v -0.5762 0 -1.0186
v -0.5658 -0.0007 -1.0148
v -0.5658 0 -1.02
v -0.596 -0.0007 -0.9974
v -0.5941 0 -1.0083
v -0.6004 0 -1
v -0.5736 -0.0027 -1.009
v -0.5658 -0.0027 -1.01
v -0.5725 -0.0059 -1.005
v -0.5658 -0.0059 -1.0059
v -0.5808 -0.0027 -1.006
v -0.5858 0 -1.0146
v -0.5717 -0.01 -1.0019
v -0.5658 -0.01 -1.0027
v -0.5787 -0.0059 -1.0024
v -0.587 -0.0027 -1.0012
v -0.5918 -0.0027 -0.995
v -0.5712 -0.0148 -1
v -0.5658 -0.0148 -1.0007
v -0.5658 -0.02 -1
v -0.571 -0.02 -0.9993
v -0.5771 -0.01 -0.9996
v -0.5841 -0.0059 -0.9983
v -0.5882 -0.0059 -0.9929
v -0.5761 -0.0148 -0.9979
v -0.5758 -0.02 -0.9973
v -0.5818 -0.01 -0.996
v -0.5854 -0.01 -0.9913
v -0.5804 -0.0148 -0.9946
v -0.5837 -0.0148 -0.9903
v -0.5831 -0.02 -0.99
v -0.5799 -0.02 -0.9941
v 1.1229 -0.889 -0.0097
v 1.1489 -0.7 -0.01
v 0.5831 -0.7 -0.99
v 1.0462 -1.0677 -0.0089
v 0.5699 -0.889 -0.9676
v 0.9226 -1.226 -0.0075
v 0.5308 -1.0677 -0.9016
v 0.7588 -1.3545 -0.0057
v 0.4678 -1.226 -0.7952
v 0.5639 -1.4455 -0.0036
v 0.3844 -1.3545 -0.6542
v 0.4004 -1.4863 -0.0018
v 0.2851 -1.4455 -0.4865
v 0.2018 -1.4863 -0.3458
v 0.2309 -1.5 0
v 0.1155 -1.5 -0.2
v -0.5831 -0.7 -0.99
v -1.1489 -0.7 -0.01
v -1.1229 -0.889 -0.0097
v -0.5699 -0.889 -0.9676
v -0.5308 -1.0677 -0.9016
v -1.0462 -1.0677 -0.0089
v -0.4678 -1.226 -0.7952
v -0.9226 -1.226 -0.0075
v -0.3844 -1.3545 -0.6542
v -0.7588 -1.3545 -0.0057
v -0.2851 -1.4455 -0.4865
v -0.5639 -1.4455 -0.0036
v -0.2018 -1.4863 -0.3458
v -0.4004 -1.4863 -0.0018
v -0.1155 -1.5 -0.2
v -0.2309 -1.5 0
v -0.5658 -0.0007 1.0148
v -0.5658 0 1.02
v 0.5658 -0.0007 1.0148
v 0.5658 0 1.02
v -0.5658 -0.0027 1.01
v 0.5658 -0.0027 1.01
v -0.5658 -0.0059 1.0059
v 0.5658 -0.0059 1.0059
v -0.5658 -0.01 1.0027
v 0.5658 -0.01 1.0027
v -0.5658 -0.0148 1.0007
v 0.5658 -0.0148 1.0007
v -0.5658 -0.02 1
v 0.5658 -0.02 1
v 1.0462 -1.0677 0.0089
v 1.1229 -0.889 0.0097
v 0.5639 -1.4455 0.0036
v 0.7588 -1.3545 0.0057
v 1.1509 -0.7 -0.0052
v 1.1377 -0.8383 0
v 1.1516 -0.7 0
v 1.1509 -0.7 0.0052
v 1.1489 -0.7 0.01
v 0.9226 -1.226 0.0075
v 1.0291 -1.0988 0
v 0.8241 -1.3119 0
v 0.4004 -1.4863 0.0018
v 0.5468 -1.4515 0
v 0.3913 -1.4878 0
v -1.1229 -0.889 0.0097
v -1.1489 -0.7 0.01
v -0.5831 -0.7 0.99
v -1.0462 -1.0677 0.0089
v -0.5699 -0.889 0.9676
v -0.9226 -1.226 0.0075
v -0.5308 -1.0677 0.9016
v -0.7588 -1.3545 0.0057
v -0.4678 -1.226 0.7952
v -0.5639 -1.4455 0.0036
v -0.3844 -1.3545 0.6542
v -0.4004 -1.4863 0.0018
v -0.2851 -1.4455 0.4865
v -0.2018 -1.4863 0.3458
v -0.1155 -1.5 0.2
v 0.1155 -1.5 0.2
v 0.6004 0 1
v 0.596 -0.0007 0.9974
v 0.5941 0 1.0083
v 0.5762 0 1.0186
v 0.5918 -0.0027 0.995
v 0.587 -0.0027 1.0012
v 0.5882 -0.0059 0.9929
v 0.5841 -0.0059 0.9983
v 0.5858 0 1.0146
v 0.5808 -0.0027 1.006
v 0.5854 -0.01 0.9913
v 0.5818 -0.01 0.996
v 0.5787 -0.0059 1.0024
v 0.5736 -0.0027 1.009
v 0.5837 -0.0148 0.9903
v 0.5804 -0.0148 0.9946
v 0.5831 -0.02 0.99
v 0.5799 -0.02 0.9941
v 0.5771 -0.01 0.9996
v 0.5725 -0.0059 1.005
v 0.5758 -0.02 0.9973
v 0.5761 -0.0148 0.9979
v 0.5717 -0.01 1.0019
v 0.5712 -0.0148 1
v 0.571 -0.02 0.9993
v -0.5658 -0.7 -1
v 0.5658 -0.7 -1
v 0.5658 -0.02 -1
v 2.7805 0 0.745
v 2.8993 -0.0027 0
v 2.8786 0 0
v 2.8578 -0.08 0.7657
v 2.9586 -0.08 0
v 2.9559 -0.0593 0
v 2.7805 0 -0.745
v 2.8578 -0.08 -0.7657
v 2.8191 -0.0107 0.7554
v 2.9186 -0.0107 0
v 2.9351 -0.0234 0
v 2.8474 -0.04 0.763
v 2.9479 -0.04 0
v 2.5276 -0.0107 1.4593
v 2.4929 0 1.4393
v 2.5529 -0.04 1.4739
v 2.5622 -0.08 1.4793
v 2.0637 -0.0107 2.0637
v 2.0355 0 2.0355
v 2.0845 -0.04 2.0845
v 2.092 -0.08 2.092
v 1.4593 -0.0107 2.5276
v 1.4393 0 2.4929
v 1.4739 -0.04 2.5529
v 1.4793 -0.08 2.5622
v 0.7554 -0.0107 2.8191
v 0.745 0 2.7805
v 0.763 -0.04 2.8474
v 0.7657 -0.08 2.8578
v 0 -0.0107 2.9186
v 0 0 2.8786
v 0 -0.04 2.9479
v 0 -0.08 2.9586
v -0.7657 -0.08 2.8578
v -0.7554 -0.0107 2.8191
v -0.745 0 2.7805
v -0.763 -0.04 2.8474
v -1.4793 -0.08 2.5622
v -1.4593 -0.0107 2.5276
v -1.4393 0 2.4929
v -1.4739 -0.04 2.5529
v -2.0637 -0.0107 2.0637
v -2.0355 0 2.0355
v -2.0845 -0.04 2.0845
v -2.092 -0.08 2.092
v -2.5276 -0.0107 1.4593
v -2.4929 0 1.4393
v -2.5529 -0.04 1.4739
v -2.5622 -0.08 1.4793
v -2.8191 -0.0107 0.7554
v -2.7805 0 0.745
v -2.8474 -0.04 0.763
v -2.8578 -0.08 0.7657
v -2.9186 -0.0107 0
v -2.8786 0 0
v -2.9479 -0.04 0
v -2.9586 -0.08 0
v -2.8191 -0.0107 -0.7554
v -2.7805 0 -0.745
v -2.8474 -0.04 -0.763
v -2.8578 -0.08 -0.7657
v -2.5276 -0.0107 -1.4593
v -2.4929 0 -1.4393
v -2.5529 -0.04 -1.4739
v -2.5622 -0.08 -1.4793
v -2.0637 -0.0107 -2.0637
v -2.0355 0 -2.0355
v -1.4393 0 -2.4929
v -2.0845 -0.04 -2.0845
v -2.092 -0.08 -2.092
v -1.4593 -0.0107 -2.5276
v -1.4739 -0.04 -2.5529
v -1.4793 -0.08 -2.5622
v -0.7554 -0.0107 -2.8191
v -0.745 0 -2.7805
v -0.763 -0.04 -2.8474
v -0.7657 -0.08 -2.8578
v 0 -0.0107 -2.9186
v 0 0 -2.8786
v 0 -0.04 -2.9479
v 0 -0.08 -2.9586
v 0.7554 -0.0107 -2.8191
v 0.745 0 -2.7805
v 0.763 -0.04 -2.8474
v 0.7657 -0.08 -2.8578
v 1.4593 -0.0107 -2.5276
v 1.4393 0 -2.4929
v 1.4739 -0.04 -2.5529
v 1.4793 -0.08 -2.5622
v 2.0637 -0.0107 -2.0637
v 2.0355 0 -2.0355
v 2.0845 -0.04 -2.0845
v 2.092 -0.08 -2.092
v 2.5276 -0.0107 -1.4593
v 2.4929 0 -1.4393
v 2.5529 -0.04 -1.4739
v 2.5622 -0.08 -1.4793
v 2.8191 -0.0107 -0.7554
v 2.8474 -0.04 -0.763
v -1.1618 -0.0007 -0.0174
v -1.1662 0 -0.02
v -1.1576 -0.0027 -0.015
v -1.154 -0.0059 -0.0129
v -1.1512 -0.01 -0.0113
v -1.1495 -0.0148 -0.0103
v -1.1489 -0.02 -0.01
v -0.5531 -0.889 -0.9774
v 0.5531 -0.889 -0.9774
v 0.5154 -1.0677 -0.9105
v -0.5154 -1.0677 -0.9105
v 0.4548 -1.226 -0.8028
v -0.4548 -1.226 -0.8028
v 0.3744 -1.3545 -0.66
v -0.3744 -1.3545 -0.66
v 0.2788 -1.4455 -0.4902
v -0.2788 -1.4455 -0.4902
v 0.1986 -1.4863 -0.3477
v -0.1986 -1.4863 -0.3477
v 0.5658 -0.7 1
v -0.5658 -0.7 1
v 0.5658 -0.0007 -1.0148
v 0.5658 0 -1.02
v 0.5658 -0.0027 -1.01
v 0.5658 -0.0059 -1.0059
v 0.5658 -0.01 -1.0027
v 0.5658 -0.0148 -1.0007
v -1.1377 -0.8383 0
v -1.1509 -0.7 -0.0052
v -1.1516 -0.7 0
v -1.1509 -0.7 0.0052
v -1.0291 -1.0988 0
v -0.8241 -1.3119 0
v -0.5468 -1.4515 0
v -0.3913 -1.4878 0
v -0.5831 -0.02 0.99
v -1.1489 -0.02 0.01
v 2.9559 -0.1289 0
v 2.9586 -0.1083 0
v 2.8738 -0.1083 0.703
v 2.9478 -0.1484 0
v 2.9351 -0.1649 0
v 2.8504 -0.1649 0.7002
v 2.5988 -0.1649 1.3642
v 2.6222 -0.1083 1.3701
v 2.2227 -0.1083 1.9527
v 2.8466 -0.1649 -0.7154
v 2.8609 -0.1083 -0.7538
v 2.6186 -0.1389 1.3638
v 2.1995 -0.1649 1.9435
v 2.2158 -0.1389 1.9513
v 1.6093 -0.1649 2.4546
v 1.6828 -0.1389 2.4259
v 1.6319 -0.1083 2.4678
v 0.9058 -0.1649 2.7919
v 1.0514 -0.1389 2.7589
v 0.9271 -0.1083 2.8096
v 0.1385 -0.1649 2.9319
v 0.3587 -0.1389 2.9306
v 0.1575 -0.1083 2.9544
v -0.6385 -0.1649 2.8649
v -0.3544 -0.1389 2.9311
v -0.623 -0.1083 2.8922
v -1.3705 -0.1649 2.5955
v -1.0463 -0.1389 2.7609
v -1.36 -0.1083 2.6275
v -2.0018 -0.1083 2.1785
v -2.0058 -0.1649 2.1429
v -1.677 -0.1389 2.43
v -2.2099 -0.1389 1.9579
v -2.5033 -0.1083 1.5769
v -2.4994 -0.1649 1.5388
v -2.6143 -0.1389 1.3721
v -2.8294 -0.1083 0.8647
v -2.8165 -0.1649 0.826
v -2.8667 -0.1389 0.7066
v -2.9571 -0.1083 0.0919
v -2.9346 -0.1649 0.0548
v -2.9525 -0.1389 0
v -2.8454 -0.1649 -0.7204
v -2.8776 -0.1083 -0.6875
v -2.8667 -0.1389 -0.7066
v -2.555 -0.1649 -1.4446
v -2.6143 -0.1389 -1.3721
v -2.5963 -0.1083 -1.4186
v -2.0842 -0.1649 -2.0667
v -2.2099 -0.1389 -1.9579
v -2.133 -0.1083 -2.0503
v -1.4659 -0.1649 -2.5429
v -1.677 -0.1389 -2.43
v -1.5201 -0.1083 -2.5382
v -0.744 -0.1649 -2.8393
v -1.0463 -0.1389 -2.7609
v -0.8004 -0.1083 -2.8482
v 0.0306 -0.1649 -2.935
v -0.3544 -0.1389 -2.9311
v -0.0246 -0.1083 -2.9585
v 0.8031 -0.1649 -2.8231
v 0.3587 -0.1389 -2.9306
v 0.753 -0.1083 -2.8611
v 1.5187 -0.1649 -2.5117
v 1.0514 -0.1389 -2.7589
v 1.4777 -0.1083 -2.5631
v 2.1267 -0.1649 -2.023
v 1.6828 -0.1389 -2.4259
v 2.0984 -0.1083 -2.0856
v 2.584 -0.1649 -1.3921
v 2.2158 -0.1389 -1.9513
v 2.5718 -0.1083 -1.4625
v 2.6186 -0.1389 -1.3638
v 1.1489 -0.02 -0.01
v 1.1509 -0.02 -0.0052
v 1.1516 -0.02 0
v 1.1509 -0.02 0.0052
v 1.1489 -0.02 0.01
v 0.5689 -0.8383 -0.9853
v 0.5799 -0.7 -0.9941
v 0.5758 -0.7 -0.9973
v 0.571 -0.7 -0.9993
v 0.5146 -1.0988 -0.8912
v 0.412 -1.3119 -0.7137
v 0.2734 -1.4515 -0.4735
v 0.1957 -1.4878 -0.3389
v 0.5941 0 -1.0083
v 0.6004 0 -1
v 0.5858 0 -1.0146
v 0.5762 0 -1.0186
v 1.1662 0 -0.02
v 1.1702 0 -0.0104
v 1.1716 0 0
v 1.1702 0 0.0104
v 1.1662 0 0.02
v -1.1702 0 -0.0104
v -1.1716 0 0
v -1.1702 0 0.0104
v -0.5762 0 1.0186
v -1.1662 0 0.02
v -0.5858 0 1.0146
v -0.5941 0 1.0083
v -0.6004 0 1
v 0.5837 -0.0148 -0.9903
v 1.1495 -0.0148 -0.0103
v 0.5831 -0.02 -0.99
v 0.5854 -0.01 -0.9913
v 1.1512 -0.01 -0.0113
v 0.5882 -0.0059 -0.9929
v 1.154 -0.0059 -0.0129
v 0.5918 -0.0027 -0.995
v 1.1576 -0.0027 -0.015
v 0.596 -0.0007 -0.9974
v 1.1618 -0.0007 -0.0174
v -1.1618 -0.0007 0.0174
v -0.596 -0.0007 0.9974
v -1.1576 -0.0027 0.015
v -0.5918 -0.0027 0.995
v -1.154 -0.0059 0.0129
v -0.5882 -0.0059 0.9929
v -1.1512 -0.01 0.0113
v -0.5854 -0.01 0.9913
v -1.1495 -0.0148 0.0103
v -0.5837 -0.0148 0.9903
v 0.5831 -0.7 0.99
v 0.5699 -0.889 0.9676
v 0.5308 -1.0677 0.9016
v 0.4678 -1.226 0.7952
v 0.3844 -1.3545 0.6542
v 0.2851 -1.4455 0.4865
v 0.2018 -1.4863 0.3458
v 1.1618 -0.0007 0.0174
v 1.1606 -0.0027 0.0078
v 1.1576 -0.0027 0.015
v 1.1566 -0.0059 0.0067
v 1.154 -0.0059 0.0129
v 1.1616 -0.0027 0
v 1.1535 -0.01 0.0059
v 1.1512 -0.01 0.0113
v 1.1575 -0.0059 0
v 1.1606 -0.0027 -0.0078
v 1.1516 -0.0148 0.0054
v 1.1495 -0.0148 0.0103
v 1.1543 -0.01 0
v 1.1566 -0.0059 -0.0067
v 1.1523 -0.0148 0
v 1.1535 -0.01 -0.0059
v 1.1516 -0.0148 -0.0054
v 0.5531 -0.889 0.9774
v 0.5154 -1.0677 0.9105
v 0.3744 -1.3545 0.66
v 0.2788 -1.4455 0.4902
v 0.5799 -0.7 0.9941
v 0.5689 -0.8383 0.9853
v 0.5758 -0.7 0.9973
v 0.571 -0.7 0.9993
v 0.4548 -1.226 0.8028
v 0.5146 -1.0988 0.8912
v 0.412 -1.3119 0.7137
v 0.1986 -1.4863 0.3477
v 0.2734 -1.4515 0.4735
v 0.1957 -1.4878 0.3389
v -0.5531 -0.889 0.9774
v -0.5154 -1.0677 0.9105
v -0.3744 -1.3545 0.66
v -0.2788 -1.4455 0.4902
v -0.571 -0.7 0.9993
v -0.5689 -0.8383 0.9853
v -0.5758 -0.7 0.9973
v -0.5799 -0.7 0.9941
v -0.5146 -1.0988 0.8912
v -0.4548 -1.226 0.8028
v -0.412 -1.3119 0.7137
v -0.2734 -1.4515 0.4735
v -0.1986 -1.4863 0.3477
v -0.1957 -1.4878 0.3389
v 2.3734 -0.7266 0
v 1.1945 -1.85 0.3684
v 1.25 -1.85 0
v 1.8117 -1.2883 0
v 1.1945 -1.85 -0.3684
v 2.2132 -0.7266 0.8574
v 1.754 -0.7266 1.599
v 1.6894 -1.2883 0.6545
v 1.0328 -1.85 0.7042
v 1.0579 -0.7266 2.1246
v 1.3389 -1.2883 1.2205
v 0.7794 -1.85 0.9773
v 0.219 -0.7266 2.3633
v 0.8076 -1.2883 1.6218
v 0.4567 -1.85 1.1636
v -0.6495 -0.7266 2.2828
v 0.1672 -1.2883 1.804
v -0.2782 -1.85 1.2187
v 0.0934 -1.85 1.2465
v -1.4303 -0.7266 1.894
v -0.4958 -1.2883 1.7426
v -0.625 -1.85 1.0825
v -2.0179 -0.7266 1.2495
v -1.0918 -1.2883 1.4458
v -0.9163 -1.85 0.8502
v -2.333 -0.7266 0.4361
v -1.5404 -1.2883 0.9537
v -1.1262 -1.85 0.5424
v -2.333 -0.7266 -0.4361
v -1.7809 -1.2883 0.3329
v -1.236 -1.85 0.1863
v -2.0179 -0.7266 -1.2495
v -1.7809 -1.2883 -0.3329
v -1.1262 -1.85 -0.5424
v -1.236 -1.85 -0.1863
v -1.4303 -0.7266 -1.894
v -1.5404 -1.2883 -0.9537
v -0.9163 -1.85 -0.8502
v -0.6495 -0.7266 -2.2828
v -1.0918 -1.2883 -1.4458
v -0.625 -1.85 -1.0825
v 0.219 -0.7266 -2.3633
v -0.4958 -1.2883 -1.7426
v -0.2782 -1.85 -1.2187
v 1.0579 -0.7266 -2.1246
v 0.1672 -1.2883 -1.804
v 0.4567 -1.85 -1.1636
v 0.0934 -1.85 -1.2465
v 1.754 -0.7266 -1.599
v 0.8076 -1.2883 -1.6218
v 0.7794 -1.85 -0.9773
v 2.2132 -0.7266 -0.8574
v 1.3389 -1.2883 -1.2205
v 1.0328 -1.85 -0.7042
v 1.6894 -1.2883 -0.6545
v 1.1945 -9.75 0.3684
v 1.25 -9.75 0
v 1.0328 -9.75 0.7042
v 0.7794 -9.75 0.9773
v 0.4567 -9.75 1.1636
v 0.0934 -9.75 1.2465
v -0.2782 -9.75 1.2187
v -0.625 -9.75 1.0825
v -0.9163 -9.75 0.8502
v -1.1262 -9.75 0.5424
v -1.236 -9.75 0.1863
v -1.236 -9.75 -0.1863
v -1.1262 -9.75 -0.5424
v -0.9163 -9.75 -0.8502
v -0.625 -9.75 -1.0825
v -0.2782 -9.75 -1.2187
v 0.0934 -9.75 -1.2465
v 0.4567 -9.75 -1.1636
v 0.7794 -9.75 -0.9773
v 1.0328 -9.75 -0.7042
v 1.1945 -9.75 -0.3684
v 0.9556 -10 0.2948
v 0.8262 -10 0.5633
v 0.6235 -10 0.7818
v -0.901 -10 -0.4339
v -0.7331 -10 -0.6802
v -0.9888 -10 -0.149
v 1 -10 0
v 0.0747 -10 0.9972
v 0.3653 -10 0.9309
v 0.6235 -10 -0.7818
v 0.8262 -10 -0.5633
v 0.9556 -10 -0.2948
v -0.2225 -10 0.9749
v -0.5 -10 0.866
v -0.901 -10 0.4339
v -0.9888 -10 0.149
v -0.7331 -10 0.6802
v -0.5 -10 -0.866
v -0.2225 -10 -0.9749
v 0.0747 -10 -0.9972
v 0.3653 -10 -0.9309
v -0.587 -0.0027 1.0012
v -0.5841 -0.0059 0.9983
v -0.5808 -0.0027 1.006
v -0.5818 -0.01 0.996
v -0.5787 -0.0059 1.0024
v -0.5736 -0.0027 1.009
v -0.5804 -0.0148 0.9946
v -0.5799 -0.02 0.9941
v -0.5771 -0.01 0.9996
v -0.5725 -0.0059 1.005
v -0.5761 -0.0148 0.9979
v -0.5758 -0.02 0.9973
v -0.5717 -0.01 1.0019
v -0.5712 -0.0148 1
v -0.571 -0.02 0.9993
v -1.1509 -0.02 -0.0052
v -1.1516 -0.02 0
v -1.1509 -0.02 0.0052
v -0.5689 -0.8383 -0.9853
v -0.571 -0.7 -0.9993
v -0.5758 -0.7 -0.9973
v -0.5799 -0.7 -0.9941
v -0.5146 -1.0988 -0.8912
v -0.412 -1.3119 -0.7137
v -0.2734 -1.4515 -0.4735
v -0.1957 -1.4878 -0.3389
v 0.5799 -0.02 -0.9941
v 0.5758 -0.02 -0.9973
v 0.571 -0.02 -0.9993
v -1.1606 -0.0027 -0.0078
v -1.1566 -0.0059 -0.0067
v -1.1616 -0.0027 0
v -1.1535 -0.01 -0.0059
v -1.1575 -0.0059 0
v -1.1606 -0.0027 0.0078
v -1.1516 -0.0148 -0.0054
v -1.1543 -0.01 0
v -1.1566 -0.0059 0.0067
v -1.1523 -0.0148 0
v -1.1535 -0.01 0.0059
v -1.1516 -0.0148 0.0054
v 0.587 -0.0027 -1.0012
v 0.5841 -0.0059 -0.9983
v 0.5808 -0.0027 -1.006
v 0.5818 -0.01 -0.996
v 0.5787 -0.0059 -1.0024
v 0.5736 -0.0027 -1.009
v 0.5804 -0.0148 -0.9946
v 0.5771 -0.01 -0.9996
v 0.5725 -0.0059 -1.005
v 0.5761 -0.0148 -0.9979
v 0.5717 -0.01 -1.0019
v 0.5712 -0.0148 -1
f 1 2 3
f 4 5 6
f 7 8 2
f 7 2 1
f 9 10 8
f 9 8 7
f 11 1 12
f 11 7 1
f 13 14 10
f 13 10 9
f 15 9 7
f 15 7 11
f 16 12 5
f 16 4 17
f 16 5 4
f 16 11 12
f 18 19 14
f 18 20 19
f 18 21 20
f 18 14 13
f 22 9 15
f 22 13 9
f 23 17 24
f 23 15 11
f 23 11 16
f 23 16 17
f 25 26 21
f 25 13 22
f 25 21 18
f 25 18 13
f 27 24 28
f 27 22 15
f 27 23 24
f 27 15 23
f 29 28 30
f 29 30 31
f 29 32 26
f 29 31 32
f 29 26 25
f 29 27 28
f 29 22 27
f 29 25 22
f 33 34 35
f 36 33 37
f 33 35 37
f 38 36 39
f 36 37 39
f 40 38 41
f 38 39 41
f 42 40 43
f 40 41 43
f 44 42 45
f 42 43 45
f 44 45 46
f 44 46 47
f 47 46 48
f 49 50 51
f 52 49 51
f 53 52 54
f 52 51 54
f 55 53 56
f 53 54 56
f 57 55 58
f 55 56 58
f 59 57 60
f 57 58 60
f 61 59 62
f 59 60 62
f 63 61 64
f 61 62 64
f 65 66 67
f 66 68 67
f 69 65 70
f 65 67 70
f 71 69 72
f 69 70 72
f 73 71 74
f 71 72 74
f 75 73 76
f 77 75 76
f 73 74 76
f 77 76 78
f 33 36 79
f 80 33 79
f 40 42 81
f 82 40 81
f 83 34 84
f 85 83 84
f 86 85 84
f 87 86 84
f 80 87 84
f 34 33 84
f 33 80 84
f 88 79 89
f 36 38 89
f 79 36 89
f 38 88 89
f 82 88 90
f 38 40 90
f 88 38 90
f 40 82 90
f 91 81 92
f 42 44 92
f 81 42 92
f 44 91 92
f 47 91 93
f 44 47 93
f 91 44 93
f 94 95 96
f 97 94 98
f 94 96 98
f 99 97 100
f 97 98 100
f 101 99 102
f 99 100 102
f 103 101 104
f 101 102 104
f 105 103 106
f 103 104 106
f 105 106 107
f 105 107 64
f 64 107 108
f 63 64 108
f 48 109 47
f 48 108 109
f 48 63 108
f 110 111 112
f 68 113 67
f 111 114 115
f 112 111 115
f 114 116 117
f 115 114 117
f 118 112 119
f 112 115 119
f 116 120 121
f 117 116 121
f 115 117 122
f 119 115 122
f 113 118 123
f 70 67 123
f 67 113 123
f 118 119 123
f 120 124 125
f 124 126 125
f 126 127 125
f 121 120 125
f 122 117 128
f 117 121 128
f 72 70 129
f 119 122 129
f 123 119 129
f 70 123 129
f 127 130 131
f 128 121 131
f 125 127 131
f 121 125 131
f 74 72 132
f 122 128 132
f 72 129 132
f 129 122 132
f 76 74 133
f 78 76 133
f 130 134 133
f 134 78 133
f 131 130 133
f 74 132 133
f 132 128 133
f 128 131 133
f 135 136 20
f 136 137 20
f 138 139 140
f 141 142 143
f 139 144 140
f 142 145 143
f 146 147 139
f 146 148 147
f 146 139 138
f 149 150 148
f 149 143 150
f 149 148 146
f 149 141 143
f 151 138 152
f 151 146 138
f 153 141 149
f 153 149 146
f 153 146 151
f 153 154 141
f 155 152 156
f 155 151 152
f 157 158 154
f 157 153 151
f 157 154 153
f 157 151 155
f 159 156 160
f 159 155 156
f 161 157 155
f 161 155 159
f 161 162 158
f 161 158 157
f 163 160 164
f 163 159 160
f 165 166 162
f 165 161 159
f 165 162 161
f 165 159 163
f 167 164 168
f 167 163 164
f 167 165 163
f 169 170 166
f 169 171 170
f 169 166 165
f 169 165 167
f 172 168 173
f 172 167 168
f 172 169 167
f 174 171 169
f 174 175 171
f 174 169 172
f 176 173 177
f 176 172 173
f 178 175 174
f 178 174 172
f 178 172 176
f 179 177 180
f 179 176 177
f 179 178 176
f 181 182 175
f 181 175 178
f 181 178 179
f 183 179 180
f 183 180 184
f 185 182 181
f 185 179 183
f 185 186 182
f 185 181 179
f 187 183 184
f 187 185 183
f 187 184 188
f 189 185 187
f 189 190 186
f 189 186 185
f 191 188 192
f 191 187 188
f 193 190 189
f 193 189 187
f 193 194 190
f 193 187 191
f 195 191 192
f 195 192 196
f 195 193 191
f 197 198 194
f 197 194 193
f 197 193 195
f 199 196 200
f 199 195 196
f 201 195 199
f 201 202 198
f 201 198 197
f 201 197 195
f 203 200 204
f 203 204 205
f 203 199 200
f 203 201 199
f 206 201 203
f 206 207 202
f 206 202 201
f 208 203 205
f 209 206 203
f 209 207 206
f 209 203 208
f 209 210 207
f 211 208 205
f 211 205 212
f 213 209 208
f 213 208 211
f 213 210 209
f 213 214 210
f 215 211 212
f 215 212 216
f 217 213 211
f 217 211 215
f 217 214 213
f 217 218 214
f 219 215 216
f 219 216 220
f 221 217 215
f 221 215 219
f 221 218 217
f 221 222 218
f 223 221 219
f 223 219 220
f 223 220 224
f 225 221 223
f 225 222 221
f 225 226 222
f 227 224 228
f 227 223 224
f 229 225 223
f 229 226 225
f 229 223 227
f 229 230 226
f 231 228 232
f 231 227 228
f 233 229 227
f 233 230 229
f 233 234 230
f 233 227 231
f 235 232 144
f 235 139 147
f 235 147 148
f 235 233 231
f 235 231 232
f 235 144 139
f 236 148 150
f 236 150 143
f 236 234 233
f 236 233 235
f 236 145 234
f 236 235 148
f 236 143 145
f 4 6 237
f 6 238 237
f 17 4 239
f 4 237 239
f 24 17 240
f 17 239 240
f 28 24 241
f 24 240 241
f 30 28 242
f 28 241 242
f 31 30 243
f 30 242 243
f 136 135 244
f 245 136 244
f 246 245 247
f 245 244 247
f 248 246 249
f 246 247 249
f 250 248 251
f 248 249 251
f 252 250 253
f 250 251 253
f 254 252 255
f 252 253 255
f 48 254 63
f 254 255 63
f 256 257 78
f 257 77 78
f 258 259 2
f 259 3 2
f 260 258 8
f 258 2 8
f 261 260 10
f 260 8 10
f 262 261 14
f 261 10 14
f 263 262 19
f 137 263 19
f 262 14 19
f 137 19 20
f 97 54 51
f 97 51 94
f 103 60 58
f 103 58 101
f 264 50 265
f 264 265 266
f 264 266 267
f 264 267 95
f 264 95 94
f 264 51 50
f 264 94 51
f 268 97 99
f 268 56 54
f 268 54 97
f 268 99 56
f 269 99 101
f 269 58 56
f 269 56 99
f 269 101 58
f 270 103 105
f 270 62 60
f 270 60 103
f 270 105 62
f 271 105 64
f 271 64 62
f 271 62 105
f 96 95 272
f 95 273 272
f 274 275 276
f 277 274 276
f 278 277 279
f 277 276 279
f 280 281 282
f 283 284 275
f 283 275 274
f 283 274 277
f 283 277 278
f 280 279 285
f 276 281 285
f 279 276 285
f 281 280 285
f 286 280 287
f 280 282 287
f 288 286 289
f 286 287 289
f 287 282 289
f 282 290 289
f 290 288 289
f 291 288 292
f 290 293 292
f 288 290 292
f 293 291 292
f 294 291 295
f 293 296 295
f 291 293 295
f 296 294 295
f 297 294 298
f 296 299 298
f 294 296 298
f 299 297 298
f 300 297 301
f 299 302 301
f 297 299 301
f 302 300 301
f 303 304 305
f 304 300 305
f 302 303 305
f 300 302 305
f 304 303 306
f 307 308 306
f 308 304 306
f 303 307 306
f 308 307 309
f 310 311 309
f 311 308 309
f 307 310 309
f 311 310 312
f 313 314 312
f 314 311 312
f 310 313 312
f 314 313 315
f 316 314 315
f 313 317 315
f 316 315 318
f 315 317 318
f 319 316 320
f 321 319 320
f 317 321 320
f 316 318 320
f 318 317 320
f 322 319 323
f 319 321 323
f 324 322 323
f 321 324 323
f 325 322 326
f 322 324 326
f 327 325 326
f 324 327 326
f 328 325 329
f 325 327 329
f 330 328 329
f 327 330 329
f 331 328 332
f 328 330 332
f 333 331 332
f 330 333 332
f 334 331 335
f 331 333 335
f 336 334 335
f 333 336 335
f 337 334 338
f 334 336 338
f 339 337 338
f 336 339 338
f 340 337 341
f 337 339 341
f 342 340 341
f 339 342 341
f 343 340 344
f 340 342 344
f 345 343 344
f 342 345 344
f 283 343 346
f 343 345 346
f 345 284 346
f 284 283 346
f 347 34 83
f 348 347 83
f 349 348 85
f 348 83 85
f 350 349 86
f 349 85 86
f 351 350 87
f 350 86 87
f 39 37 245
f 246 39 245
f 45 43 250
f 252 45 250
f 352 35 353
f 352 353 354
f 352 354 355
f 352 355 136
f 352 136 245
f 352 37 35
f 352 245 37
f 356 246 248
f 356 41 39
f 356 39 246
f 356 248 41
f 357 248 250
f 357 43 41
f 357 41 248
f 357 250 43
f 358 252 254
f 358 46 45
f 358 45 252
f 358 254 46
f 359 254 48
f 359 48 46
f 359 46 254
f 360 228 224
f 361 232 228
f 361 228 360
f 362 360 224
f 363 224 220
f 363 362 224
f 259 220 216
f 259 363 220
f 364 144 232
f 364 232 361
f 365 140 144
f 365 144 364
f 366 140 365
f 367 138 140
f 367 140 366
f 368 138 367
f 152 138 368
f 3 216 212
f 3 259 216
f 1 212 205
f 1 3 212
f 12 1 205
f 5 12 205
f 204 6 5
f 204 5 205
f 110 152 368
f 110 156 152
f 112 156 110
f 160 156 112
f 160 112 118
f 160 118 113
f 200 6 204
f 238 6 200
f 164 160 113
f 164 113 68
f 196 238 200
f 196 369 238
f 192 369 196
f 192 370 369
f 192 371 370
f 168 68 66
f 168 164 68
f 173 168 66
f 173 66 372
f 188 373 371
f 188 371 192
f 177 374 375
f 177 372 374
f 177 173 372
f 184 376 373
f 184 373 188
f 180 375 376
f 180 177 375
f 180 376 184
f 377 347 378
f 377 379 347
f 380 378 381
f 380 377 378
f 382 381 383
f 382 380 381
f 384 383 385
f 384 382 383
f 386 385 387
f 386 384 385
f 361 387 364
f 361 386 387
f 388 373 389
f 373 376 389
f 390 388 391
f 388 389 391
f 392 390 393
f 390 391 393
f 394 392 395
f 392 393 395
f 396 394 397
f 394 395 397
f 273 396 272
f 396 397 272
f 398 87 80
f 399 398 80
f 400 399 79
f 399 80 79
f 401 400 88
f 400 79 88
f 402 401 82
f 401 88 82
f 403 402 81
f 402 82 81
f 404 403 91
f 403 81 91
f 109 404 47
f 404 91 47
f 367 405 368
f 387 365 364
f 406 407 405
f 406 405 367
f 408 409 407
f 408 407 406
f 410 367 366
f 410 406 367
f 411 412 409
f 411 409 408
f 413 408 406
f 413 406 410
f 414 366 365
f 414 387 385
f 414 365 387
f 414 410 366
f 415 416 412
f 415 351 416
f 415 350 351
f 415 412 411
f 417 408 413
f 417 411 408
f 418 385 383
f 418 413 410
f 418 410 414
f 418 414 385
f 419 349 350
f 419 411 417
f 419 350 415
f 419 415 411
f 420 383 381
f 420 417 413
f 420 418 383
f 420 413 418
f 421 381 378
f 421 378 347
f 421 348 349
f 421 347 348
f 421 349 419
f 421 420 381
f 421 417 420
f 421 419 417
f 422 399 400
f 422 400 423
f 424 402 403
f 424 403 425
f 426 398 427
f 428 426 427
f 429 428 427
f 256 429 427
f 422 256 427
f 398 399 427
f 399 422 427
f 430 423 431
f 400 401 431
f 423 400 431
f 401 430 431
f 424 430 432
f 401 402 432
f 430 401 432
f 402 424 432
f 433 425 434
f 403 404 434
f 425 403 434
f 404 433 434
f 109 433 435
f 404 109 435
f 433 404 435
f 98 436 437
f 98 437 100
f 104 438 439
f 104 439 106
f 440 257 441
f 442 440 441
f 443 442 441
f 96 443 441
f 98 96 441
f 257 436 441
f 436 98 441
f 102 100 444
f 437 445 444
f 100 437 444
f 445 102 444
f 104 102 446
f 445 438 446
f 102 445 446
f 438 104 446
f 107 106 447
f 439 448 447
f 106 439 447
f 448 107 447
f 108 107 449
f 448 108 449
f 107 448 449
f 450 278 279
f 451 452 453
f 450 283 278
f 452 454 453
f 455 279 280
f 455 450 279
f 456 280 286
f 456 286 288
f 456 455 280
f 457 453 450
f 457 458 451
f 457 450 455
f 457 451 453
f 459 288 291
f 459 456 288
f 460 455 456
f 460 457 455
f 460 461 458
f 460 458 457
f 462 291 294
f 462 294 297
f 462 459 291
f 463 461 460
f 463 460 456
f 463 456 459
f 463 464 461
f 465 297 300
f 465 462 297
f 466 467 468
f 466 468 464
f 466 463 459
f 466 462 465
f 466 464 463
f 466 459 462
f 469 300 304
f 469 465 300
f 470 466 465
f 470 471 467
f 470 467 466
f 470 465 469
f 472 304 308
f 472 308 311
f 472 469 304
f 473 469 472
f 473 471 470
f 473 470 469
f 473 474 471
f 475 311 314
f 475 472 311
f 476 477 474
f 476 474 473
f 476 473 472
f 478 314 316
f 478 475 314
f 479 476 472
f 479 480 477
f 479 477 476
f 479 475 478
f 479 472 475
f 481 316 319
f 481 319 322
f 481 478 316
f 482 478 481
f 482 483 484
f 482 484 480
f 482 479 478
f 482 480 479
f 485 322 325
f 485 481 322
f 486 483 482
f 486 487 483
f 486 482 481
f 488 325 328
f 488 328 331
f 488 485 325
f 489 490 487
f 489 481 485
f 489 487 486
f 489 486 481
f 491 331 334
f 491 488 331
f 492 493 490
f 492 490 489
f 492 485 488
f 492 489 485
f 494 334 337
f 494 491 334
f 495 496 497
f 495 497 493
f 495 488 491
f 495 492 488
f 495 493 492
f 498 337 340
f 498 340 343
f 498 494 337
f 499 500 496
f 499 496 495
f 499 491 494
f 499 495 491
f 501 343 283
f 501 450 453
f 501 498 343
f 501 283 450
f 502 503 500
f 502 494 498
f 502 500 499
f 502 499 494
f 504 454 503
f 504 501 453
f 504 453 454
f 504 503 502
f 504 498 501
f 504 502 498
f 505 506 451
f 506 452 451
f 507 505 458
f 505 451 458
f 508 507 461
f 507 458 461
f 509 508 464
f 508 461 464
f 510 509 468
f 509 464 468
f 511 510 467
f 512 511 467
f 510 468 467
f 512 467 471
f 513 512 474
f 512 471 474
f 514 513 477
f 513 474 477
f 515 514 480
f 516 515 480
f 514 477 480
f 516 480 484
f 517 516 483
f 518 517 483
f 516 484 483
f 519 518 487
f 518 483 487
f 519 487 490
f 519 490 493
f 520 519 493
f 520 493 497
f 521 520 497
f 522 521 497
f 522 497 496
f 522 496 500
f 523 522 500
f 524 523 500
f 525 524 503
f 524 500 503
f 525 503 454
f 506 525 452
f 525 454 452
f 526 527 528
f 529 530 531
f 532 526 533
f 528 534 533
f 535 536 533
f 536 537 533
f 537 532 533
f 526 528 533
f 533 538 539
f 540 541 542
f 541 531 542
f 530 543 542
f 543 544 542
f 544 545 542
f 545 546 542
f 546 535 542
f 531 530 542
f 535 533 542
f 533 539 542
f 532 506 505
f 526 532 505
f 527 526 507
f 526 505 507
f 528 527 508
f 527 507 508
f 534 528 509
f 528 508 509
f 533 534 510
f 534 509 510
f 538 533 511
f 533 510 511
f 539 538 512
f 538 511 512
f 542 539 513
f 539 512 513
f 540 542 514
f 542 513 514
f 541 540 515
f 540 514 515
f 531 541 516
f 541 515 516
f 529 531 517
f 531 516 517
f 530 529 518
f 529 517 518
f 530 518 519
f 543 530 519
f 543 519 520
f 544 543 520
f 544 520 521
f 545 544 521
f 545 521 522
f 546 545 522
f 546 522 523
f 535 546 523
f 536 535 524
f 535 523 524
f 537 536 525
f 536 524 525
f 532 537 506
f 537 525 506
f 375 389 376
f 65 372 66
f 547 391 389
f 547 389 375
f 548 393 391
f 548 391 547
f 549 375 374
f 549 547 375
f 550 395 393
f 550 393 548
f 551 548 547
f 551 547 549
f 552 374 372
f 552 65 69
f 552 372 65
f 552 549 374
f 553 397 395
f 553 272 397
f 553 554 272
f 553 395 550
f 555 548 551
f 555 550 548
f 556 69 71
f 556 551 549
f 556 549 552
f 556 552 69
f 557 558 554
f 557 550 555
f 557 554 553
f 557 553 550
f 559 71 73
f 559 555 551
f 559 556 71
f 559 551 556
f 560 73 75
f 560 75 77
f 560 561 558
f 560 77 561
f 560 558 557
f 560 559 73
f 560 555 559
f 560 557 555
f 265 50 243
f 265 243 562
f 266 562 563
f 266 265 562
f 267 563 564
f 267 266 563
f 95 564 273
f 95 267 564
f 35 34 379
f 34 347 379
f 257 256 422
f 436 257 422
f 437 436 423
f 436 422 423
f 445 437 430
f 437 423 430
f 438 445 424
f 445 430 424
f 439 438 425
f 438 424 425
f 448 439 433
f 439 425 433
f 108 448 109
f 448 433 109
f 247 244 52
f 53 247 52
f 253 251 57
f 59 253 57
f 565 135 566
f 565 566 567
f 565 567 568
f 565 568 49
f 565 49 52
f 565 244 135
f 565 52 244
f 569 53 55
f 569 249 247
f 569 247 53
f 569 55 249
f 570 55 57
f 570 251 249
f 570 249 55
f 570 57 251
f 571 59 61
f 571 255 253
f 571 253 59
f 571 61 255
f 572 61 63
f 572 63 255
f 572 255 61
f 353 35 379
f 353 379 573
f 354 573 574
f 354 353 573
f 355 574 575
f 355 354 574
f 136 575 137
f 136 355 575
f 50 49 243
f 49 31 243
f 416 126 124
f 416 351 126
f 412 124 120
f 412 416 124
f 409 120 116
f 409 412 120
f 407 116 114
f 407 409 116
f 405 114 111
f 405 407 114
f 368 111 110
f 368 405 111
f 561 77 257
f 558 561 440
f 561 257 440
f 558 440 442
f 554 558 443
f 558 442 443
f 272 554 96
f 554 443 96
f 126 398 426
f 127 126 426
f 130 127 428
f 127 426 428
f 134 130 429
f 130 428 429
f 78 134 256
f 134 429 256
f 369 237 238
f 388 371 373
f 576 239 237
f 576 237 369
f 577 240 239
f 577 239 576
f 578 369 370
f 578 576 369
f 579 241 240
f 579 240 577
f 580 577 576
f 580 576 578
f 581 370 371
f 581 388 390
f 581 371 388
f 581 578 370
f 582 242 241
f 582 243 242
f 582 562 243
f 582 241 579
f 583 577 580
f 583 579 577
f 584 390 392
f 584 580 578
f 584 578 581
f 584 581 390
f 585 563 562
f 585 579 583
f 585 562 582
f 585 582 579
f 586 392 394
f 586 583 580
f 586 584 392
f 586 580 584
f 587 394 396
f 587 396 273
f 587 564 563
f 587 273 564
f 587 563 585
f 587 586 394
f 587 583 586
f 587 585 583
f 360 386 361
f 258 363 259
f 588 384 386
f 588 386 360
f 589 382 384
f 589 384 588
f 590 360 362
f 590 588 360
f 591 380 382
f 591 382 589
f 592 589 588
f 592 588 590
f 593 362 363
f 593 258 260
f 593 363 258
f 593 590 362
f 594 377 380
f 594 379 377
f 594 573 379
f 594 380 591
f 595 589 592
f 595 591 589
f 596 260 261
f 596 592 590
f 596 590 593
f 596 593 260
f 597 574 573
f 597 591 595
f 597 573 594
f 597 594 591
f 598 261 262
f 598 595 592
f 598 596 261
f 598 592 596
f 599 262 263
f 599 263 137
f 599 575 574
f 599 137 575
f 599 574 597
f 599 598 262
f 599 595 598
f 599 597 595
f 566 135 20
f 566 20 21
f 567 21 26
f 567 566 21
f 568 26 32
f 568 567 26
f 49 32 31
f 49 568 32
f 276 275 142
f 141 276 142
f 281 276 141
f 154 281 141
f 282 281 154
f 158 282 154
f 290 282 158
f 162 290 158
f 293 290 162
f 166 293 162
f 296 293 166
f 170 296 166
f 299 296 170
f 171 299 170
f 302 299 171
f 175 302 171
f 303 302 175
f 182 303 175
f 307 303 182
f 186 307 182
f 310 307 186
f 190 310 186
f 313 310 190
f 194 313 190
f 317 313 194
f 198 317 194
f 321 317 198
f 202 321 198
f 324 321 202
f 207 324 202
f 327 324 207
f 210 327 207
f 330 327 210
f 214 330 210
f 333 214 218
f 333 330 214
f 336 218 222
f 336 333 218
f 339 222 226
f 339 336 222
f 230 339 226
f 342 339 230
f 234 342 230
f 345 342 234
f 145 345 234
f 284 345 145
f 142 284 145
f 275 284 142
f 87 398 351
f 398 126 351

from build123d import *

# Parameters (mm, degrees)
SKETCH8_W          = 1.25
SKETCH8_H          = 10
CHAMFER1_SIZE      = 0.25
CHAMFER2_SIZE2     = 0.2
CHAMFER2_SIZE      = 0.141421
FILLET1_R          = 0.08
CUT_EXTRUDE1_DEPTH = 1.5
FILLET2_R          = 0.8
FILLET5_R          = 0.02


with BuildPart() as part:
    # Sketch8 → Revolve1 (revolve)
    with BuildSketch(Plane.XY):
        with Locations((0.625, -5)):
            Rectangle(SKETCH8_W, SKETCH8_H)
    revolve(axis=Axis((0, 0, 0), (0, -1, 0)))

    # Chamfer1
    chamfer1_edges = [part.edges().sort_by_distance(p)[0] for p in [
        (-1.25, -10, 0),
    ]]
    chamfer(chamfer1_edges, length=CHAMFER1_SIZE)

    # Sketch13 → Revolve2 (revolve)
    with BuildSketch(Plane.XY):
        Polygon((0, 0), (3.1, 0), (0, -3.1), align=None)
    revolve(axis=Axis((0, 0, 0), (0, -1, 0)))

    # Chamfer2
    chamfer2_edges = [part.edges().sort_by_distance(p)[0] for p in [
        (-3.1, 0, 0),
    ]]
    chamfer(chamfer2_edges, length=CHAMFER2_SIZE, length2=CHAMFER2_SIZE2)

    # Fillet1
    fillet1_edges = [part.edges().sort_by_distance(p)[0] for p in [
        (-2.958578, 0, 0),
        (-2.958578, -0.141421, 0),
    ]]
    fillet(fillet1_edges, radius=FILLET1_R)

    # Sketch14 → Cut-Extrude1 (cut)
    with BuildSketch(Plane(origin=(0, 0, 0), x_dir=(1, 0, 0), z_dir=(0, 1, 0))):
        Polygon((1.154701, 0), (0.57735, 1), (-0.57735, 1), (-1.154701, 0), (-0.57735, -1), (0.57735, -1), align=None)
    extrude(amount=-CUT_EXTRUDE1_DEPTH, mode=Mode.SUBTRACT)

    # Fillet2
    fillet2_edges = [part.edges().sort_by_distance(p)[0] for p in [
        (0.866025, -1.5, 0.5),
        (0, -1.5, 1),
        (-0.866025, -1.5, 0.5),
        (-0.866025, -1.5, -0.5),
        (0, -1.5, -1),
        (0.866025, -1.5, -0.5),
    ]]
    fillet(fillet2_edges, radius=FILLET2_R)

    # Fillet5
    fillet5_edges = [part.edges().sort_by_distance(p)[0] for p in [
        (0.866025, 0, 0.5),
        (0.866025, 0, -0.5),
        (0, 0, -1),
        (-0.866025, 0, -0.5),
        (-0.866025, 0, 0.5),
        (0, 0, 1),
        (0.57735, -0.35, 1),
        (-0.57735, -0.35, 1),
        (-1.154701, -0.35, 0),
        (-0.57735, -0.35, -1),
        (0.57735, -0.35, -1),
        (1.154701, -0.35, 0),
        (-0.430209, -1.285507, -0.745143),
        (0.430209, -1.285507, -0.745143),
        (-0.860417, -1.285507, 0),
        (0.860417, -1.285507, 0),
        (-0.430209, -1.285507, 0.745143),
        (0.430209, -1.285507, 0.745143),
    ]]
    fillet(fillet5_edges, radius=FILLET5_R)


solid = part.part
